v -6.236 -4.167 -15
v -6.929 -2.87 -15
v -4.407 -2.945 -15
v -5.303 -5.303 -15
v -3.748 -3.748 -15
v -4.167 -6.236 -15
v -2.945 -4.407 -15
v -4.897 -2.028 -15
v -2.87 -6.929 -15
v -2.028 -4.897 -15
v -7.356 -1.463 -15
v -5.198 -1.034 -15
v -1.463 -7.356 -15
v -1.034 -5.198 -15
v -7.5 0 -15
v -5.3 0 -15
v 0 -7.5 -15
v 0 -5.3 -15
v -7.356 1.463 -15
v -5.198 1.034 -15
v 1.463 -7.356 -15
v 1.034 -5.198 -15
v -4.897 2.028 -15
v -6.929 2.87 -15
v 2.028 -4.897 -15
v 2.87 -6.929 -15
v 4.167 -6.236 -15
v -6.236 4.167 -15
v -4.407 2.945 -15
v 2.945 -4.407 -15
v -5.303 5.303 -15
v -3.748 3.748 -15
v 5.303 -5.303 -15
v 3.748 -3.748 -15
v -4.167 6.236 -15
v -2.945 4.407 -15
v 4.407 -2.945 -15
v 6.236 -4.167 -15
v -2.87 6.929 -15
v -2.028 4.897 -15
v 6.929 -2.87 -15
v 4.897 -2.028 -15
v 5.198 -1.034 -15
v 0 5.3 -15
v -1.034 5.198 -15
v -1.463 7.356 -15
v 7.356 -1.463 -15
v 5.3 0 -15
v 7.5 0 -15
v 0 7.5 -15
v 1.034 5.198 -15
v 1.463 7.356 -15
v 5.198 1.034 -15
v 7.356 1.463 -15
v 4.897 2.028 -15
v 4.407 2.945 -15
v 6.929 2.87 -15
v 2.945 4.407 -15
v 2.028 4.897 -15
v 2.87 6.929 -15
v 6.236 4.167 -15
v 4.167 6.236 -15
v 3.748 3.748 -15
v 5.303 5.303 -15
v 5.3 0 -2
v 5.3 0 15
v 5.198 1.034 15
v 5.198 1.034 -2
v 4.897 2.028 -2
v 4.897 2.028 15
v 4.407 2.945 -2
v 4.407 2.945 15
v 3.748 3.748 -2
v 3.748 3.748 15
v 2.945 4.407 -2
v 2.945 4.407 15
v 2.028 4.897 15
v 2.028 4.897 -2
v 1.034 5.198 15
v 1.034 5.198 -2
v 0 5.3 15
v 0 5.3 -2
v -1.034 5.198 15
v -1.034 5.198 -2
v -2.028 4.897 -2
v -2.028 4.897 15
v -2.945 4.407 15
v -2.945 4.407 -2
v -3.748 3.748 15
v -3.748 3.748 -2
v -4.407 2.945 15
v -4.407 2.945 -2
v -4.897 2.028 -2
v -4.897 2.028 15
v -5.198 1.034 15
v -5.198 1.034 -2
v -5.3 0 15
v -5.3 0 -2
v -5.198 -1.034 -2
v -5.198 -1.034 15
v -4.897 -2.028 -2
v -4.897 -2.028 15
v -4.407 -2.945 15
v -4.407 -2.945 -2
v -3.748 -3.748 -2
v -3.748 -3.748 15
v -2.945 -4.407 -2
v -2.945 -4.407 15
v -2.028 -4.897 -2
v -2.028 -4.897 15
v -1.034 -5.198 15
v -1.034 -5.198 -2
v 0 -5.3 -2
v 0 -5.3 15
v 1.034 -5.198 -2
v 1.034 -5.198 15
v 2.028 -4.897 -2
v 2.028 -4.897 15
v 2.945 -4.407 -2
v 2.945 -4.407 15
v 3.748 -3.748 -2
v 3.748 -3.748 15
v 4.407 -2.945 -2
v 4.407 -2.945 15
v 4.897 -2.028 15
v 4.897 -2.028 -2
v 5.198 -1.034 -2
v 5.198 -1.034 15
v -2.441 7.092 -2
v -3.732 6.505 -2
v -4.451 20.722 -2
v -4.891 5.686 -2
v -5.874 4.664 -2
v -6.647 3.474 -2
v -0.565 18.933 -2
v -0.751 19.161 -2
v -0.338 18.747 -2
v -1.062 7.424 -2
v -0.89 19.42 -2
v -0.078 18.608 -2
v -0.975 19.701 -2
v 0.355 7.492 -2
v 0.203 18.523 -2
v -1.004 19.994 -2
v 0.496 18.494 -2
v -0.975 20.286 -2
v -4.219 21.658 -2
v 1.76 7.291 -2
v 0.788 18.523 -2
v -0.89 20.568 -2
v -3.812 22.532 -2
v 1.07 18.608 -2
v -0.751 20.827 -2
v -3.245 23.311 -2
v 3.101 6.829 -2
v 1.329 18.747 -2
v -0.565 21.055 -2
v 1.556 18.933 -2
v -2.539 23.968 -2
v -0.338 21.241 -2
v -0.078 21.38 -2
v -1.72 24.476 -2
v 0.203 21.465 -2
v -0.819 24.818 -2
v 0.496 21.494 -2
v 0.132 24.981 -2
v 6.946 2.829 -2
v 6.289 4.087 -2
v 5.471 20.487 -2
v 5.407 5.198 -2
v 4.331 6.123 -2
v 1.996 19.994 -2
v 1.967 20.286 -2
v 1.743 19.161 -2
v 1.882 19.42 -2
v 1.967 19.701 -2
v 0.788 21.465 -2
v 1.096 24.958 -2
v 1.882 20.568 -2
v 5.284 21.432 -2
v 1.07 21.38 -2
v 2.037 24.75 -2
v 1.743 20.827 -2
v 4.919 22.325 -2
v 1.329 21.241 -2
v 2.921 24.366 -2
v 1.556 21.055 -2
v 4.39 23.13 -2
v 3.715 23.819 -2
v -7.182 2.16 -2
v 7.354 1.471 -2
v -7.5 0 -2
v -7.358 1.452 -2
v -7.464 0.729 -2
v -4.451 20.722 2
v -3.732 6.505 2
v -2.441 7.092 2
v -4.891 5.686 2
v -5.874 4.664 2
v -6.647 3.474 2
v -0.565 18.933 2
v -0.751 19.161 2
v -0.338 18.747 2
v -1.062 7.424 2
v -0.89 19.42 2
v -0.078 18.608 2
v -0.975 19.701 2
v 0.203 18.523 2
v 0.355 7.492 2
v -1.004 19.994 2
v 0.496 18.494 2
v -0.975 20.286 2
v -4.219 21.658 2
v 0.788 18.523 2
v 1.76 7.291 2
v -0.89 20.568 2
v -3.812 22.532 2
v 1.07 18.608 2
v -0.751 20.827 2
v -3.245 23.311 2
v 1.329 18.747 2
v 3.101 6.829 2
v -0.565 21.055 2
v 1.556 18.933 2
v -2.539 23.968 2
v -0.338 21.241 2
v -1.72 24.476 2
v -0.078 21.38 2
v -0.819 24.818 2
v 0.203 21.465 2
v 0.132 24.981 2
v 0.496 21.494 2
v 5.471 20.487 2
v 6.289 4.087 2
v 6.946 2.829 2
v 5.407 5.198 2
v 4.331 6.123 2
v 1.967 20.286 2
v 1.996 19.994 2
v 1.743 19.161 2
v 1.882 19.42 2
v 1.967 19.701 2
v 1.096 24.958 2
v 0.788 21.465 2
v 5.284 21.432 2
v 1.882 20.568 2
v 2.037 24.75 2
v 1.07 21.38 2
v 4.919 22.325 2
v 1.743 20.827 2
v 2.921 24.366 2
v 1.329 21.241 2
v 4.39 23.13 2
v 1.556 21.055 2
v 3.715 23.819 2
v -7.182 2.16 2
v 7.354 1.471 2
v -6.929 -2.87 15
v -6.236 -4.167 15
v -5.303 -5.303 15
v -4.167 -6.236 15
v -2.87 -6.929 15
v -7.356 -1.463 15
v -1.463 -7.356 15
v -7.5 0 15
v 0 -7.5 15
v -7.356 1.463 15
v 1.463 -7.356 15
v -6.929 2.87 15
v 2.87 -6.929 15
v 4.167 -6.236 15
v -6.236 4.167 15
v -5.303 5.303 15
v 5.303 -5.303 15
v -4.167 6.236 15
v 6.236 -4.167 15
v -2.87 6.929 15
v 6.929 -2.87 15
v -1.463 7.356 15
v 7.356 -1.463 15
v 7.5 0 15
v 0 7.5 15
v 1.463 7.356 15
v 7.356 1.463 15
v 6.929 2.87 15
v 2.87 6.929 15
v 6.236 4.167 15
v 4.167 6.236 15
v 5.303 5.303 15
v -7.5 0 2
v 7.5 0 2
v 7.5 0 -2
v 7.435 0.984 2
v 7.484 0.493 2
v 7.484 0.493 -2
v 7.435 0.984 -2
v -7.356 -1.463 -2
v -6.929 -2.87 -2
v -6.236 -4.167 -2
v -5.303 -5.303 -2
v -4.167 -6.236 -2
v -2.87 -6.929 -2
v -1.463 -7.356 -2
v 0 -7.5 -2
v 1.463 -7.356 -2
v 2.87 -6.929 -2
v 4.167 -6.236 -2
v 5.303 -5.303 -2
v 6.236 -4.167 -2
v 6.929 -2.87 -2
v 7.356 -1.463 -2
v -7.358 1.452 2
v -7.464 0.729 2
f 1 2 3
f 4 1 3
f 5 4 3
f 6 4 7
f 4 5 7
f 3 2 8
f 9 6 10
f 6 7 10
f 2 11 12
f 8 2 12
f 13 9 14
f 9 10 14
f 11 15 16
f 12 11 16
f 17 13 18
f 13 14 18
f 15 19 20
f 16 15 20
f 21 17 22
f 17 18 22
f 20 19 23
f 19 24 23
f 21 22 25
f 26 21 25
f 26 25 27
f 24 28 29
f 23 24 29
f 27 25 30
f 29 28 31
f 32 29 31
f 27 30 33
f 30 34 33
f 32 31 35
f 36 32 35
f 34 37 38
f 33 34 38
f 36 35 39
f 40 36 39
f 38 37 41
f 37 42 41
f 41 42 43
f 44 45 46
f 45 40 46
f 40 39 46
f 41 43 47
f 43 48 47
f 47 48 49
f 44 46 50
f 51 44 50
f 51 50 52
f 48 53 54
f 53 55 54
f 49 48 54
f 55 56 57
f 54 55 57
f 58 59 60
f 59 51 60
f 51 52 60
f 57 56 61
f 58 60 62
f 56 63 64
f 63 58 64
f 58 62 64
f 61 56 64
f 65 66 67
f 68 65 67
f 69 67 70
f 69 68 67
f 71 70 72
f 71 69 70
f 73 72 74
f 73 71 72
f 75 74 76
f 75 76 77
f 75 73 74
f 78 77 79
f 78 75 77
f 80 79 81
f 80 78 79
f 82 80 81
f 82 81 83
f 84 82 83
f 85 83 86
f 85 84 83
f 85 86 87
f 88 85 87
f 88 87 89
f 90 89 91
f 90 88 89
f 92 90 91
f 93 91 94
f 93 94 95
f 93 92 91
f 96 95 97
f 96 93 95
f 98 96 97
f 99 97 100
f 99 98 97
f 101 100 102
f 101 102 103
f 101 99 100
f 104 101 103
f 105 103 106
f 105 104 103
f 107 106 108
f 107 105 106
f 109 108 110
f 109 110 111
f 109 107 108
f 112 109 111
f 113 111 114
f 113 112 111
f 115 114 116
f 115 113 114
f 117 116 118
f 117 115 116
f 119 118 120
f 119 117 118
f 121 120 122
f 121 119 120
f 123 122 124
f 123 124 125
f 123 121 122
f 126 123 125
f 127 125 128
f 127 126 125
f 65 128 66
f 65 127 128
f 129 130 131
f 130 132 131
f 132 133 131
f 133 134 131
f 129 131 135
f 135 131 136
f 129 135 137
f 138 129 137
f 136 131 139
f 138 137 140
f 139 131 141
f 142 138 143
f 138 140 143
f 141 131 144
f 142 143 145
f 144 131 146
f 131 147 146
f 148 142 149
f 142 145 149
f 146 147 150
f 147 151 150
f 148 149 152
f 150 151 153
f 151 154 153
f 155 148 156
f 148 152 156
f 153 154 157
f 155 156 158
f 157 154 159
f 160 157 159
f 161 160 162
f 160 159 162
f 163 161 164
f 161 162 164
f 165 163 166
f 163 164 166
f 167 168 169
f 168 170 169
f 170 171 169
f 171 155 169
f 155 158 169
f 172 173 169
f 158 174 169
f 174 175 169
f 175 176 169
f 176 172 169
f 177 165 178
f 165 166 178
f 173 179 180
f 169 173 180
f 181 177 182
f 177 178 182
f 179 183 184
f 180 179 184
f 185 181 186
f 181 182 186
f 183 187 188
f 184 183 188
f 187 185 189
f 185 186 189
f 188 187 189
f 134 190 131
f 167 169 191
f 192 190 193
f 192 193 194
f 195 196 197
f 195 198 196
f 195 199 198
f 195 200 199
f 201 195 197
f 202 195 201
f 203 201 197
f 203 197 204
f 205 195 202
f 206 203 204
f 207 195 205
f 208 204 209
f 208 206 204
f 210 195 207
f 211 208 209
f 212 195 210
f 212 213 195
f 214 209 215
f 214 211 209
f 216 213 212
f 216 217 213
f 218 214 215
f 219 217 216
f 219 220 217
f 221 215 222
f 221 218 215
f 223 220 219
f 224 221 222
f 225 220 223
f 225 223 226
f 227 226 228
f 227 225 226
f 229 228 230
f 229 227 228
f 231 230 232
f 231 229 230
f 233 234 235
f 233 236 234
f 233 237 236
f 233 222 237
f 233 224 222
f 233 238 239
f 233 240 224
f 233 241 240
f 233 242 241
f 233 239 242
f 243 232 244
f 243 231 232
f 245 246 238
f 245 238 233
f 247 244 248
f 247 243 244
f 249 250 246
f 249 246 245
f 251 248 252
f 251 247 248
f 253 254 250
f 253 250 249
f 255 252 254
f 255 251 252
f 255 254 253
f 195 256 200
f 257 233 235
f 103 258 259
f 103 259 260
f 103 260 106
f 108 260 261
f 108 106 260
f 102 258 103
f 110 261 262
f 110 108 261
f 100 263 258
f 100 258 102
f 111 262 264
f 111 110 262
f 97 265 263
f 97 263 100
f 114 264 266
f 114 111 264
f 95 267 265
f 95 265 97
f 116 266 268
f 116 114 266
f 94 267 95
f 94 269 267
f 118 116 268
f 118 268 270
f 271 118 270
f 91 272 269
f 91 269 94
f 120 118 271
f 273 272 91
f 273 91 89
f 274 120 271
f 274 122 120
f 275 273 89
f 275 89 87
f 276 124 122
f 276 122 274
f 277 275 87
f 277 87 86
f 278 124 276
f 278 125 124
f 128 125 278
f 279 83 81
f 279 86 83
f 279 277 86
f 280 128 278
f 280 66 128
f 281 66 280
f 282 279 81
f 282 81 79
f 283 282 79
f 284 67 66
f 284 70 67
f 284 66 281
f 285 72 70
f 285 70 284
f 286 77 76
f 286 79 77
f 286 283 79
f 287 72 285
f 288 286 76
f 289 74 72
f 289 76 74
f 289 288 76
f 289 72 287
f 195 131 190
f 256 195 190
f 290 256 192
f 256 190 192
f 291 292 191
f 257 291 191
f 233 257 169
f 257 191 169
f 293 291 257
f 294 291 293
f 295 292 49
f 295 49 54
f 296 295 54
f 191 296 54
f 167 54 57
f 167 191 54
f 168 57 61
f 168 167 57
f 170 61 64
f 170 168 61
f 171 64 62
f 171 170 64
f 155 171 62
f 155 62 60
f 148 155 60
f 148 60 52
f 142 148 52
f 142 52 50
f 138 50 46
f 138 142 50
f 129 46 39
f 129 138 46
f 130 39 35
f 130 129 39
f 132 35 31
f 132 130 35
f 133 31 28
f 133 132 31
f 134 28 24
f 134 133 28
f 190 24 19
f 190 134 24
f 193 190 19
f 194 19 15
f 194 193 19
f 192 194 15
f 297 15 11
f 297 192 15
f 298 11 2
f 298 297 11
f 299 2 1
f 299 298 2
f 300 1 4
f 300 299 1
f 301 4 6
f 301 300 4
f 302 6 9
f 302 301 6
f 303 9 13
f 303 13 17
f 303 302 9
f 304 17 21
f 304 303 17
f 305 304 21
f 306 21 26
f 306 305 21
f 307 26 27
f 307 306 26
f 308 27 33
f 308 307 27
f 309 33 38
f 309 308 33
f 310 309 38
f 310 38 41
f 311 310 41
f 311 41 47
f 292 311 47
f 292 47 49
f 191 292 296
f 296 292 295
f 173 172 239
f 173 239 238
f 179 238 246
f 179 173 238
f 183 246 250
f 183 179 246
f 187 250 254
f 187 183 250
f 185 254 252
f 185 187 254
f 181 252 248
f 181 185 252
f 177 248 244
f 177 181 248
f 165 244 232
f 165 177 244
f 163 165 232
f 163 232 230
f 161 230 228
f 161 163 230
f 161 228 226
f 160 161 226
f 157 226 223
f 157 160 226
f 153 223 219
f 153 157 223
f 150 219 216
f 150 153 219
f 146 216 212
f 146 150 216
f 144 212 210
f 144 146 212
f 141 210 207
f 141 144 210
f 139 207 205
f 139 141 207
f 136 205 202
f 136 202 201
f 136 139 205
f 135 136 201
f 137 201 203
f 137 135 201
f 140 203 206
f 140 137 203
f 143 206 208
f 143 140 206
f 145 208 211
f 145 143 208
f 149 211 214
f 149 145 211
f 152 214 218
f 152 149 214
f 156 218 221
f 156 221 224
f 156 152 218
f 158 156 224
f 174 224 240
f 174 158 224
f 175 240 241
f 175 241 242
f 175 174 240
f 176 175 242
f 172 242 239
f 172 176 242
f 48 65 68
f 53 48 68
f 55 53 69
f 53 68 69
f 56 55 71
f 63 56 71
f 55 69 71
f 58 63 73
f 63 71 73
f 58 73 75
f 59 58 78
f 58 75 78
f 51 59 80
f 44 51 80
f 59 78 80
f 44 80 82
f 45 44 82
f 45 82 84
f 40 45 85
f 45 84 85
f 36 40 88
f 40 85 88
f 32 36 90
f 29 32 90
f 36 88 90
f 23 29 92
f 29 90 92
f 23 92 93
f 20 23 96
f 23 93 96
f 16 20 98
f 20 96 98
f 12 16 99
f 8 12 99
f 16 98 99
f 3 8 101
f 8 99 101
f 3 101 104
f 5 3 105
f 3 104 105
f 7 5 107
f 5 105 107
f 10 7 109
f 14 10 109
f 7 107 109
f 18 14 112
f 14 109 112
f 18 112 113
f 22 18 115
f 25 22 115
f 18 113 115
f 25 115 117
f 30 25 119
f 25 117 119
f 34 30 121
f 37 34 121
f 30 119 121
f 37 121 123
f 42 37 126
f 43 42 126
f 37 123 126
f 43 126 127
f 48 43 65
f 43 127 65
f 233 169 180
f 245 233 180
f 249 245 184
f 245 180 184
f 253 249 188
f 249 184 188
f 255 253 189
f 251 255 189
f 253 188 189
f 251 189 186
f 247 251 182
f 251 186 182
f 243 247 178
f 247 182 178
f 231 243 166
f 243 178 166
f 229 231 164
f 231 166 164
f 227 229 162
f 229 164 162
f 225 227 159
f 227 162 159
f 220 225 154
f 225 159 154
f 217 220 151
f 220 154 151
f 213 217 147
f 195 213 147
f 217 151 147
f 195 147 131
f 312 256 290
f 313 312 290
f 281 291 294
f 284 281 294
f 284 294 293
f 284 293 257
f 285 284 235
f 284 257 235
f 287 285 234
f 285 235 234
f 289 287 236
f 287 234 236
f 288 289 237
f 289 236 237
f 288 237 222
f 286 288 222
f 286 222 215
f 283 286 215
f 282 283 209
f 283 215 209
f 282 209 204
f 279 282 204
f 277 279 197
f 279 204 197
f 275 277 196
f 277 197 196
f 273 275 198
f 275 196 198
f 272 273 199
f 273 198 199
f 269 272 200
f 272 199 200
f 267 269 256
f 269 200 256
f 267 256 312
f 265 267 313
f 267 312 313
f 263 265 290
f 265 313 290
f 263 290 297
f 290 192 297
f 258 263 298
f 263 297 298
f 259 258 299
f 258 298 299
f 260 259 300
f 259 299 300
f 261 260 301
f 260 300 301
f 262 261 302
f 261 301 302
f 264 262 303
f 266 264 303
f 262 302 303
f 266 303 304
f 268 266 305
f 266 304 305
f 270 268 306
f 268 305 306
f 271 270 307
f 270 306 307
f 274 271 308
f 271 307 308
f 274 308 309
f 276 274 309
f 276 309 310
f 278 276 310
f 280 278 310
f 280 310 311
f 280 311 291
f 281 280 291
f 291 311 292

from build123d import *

# Parameters (mm, degrees)
BOSS_EXTRU_2_DEPTH      = 2
BOSS_EXTRU_2_DEPTH_BACK = 2
ESQUISSE1_R             = 5.3
ESQUISSE1_R_2           = 1.5
ESQUISSE2_R             = 7.5
ESQUISSE2_R_2           = 5.3
BOSS_EXTRU_3_DEPTH      = 13


with BuildPart() as part:
    # Esquisse1 → Boss.-Extru.2 (new, two sides: drawn at the far end of the back side and taken through both)
    with BuildSketch(Plane.XY.offset(-BOSS_EXTRU_2_DEPTH_BACK)):
        with BuildLine():
            ThreePointArc((-7.5, 0), (0, -7.5), (7.5, 0))
            Line((7.5, 0), (5.471395589, 20.4865521))
            ThreePointArc((5.471395589, 20.4865521), (0.614199015, 24.992451663), (-4.451008104, 20.721717969))
            Line((-4.451008104, 20.721717969), (-7.5, 0))
        make_face()
        Circle(ESQUISSE1_R, mode=Mode.SUBTRACT)
        with Locations((0.495729813, 19.993855355)):
            Circle(ESQUISSE1_R_2, mode=Mode.SUBTRACT)
    extrude(amount=BOSS_EXTRU_2_DEPTH + BOSS_EXTRU_2_DEPTH_BACK)

    # Esquisse2 → Boss.-Extru.3 (add)
    with BuildSketch(Plane.XY.offset(2)):
        Circle(ESQUISSE2_R)
        Circle(ESQUISSE2_R_2, mode=Mode.SUBTRACT)
    boss_extru_3 = extrude(amount=BOSS_EXTRU_3_DEPTH)

    # Symétrie1: Boss.-Extru.3 across plane
    add(boss_extru_3.mirror(Plane.XY))


solid = part.part
